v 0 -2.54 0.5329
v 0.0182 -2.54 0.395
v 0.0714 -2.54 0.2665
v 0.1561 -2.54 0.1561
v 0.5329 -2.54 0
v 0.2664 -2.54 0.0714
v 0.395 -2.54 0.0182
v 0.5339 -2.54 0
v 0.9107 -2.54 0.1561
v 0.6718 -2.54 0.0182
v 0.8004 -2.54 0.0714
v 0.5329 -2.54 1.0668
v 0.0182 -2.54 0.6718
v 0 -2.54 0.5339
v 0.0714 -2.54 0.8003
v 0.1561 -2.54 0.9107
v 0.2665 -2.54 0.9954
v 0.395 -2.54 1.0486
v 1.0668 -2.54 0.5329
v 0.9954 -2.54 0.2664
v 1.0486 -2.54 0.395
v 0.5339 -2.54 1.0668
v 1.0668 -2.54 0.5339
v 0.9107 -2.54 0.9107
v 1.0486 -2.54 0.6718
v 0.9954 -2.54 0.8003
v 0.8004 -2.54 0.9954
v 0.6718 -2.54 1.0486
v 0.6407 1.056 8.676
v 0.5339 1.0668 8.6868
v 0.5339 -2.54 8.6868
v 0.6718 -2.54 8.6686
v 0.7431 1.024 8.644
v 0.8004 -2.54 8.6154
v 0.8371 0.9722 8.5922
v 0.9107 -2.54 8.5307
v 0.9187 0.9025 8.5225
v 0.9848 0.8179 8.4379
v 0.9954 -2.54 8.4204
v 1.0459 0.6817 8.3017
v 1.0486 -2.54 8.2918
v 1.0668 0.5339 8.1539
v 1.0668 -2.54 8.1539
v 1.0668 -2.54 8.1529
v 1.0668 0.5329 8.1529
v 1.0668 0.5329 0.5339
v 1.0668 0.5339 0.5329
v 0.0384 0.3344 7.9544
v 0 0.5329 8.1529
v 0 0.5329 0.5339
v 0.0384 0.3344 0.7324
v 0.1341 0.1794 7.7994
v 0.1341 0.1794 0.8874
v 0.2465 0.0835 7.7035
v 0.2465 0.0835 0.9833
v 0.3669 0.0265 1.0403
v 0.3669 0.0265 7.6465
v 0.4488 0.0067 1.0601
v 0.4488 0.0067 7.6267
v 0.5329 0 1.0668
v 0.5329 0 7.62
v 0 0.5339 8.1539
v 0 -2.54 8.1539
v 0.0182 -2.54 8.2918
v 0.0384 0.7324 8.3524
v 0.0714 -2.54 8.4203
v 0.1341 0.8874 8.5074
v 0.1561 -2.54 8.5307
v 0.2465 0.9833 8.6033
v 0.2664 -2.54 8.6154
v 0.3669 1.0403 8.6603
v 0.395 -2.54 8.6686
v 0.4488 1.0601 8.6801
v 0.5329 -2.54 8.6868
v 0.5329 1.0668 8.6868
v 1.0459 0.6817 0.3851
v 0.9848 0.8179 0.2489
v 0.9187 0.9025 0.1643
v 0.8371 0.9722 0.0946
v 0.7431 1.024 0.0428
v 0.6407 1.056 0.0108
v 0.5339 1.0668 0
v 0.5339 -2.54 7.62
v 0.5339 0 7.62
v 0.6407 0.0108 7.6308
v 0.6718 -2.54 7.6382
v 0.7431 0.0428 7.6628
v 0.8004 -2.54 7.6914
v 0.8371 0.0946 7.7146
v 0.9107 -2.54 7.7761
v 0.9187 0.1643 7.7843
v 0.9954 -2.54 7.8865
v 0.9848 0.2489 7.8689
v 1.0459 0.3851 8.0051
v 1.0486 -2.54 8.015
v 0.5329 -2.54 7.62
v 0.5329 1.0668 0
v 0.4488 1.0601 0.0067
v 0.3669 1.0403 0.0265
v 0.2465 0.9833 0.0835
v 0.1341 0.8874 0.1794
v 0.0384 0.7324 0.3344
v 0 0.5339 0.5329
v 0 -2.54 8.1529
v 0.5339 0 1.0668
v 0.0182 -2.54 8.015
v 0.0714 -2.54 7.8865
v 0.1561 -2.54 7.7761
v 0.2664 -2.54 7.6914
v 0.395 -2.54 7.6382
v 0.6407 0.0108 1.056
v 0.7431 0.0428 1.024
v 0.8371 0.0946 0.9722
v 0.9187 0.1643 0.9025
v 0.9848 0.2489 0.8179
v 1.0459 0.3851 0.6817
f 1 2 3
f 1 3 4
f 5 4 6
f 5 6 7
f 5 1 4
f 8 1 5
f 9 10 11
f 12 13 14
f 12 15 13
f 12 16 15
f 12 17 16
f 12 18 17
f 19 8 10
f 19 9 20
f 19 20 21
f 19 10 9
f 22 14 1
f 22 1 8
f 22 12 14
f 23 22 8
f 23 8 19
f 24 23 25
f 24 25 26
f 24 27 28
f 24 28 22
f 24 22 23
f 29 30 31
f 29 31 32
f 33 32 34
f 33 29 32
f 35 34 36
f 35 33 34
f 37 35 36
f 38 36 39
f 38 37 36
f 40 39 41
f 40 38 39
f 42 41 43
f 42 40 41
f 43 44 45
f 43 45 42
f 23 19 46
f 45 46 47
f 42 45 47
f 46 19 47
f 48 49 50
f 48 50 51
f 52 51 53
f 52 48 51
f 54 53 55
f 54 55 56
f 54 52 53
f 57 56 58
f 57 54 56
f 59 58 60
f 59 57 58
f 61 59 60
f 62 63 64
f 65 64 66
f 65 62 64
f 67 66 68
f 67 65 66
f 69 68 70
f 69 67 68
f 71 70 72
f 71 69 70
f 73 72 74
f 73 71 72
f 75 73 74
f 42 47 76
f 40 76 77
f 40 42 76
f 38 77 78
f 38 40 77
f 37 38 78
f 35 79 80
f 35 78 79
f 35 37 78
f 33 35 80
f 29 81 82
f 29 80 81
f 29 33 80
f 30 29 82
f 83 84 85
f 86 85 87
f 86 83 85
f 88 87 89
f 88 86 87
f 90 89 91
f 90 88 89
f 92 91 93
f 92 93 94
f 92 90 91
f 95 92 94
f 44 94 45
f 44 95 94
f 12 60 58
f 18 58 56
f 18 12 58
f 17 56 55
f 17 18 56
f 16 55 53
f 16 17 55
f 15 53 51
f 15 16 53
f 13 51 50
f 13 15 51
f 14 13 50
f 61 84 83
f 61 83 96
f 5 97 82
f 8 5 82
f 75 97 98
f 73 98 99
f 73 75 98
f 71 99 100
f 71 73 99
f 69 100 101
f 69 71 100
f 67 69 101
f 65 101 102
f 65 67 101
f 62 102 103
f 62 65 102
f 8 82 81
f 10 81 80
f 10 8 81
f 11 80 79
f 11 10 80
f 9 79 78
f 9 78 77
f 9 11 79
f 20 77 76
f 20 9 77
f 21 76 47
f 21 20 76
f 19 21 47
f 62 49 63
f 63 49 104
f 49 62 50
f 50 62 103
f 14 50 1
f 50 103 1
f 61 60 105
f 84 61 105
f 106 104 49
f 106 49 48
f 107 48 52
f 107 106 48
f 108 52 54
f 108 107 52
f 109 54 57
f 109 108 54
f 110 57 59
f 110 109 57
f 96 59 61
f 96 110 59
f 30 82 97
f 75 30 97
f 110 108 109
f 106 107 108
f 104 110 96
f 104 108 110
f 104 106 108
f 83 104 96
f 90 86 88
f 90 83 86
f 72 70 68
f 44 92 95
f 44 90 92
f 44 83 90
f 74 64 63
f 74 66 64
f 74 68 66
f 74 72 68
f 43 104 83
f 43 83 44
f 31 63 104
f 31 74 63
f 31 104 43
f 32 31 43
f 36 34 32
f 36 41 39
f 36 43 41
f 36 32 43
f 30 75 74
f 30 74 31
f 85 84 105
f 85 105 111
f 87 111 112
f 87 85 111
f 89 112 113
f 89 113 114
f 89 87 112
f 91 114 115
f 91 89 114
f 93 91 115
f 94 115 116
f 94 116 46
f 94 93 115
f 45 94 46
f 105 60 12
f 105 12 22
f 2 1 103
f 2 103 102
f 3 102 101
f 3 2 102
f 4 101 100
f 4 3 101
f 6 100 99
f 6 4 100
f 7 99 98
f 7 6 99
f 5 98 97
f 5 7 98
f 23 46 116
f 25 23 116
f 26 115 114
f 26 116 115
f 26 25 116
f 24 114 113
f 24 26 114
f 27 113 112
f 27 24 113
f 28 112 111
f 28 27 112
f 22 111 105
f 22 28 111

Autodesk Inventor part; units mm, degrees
ref_plane "YZ Plane" through (0, 0, 0) normal (1, 0, 0) x (0, 1, 0)
ref_plane "XZ Plane" through (0, 0, 0) normal (0, 1, 0) x (-1, 0, 0)
ref_plane "XY Plane" through (0, 0, 0) normal (0, 0, 1) x (1, 0, 0)
sketch "Sketch1" plane through (0, 0, 0) normal (0, 0, 1) x (1, 0, 0)
  line L0 (0, 0) -> (1.0668, 0)
  line L1 (1.0668, 0) -> (1.0668, 1.0668)
  line L2 (1.0668, 1.0668) -> (0, 1.0668)
  line L3 (0, 1.0668) -> (0, 0)
  dimension "d0" = 1.0668
  dimension "d1" = 1.0668
extrude "Extrusion1" add sketch "Sketch1" along normal blind 8.6868
sketch "Sketch2" plane through (0, 0, 0) normal (0, -1, 0) x (1, 0, 0)
  line L0 (0, 0) -> (0, 8.6868) projected
  line L1 (1.0668, 0) -> (0, 0)
  line L2 (0, 0) -> (0, 1.0668)
  line L3 (0, 1.0668) -> (1.0668, 1.0668)
  line L4 (1.0668, 1.0668) -> (1.0668, 0)
  line L5 (1.0668, 0) -> (1.0668, 8.6868) projected
  line L6 (0, 8.6868) -> (1.0668, 8.6868)
  line L7 (1.0668, 8.6868) -> (1.0668, 7.62)
  line L8 (1.0668, 7.62) -> (0, 7.62)
  line L9 (0, 7.62) -> (0, 8.6868)
  dimension "d4" = 1.0668
  dimension "d5" = 1.0668
extrude "Extrusion2" add sketch "Sketch2" along normal blind 2.54 contours L0 L3 L4 L1 | L0 L6 L5 L8
fillet "Fillet1" radius 0.5334 12 edges at (1.0668, 1.0668, 4.3434) (0, 1.0668, 4.3434) (0, 0, 4.3434) (1.0668, 0, 4.3434) (1.0668, -1.27, 1.0668) (1.0668, -0.7366, 0) (0, -0.7366, 0) (0, -1.27, 1.0668) (0, -1.27, 7.62) (1.0668, -1.27, 7.62) (0, -0.7366, 8.6868) (1.0668, -0.7366, 8.6868)
properties part number "Wire 3"
